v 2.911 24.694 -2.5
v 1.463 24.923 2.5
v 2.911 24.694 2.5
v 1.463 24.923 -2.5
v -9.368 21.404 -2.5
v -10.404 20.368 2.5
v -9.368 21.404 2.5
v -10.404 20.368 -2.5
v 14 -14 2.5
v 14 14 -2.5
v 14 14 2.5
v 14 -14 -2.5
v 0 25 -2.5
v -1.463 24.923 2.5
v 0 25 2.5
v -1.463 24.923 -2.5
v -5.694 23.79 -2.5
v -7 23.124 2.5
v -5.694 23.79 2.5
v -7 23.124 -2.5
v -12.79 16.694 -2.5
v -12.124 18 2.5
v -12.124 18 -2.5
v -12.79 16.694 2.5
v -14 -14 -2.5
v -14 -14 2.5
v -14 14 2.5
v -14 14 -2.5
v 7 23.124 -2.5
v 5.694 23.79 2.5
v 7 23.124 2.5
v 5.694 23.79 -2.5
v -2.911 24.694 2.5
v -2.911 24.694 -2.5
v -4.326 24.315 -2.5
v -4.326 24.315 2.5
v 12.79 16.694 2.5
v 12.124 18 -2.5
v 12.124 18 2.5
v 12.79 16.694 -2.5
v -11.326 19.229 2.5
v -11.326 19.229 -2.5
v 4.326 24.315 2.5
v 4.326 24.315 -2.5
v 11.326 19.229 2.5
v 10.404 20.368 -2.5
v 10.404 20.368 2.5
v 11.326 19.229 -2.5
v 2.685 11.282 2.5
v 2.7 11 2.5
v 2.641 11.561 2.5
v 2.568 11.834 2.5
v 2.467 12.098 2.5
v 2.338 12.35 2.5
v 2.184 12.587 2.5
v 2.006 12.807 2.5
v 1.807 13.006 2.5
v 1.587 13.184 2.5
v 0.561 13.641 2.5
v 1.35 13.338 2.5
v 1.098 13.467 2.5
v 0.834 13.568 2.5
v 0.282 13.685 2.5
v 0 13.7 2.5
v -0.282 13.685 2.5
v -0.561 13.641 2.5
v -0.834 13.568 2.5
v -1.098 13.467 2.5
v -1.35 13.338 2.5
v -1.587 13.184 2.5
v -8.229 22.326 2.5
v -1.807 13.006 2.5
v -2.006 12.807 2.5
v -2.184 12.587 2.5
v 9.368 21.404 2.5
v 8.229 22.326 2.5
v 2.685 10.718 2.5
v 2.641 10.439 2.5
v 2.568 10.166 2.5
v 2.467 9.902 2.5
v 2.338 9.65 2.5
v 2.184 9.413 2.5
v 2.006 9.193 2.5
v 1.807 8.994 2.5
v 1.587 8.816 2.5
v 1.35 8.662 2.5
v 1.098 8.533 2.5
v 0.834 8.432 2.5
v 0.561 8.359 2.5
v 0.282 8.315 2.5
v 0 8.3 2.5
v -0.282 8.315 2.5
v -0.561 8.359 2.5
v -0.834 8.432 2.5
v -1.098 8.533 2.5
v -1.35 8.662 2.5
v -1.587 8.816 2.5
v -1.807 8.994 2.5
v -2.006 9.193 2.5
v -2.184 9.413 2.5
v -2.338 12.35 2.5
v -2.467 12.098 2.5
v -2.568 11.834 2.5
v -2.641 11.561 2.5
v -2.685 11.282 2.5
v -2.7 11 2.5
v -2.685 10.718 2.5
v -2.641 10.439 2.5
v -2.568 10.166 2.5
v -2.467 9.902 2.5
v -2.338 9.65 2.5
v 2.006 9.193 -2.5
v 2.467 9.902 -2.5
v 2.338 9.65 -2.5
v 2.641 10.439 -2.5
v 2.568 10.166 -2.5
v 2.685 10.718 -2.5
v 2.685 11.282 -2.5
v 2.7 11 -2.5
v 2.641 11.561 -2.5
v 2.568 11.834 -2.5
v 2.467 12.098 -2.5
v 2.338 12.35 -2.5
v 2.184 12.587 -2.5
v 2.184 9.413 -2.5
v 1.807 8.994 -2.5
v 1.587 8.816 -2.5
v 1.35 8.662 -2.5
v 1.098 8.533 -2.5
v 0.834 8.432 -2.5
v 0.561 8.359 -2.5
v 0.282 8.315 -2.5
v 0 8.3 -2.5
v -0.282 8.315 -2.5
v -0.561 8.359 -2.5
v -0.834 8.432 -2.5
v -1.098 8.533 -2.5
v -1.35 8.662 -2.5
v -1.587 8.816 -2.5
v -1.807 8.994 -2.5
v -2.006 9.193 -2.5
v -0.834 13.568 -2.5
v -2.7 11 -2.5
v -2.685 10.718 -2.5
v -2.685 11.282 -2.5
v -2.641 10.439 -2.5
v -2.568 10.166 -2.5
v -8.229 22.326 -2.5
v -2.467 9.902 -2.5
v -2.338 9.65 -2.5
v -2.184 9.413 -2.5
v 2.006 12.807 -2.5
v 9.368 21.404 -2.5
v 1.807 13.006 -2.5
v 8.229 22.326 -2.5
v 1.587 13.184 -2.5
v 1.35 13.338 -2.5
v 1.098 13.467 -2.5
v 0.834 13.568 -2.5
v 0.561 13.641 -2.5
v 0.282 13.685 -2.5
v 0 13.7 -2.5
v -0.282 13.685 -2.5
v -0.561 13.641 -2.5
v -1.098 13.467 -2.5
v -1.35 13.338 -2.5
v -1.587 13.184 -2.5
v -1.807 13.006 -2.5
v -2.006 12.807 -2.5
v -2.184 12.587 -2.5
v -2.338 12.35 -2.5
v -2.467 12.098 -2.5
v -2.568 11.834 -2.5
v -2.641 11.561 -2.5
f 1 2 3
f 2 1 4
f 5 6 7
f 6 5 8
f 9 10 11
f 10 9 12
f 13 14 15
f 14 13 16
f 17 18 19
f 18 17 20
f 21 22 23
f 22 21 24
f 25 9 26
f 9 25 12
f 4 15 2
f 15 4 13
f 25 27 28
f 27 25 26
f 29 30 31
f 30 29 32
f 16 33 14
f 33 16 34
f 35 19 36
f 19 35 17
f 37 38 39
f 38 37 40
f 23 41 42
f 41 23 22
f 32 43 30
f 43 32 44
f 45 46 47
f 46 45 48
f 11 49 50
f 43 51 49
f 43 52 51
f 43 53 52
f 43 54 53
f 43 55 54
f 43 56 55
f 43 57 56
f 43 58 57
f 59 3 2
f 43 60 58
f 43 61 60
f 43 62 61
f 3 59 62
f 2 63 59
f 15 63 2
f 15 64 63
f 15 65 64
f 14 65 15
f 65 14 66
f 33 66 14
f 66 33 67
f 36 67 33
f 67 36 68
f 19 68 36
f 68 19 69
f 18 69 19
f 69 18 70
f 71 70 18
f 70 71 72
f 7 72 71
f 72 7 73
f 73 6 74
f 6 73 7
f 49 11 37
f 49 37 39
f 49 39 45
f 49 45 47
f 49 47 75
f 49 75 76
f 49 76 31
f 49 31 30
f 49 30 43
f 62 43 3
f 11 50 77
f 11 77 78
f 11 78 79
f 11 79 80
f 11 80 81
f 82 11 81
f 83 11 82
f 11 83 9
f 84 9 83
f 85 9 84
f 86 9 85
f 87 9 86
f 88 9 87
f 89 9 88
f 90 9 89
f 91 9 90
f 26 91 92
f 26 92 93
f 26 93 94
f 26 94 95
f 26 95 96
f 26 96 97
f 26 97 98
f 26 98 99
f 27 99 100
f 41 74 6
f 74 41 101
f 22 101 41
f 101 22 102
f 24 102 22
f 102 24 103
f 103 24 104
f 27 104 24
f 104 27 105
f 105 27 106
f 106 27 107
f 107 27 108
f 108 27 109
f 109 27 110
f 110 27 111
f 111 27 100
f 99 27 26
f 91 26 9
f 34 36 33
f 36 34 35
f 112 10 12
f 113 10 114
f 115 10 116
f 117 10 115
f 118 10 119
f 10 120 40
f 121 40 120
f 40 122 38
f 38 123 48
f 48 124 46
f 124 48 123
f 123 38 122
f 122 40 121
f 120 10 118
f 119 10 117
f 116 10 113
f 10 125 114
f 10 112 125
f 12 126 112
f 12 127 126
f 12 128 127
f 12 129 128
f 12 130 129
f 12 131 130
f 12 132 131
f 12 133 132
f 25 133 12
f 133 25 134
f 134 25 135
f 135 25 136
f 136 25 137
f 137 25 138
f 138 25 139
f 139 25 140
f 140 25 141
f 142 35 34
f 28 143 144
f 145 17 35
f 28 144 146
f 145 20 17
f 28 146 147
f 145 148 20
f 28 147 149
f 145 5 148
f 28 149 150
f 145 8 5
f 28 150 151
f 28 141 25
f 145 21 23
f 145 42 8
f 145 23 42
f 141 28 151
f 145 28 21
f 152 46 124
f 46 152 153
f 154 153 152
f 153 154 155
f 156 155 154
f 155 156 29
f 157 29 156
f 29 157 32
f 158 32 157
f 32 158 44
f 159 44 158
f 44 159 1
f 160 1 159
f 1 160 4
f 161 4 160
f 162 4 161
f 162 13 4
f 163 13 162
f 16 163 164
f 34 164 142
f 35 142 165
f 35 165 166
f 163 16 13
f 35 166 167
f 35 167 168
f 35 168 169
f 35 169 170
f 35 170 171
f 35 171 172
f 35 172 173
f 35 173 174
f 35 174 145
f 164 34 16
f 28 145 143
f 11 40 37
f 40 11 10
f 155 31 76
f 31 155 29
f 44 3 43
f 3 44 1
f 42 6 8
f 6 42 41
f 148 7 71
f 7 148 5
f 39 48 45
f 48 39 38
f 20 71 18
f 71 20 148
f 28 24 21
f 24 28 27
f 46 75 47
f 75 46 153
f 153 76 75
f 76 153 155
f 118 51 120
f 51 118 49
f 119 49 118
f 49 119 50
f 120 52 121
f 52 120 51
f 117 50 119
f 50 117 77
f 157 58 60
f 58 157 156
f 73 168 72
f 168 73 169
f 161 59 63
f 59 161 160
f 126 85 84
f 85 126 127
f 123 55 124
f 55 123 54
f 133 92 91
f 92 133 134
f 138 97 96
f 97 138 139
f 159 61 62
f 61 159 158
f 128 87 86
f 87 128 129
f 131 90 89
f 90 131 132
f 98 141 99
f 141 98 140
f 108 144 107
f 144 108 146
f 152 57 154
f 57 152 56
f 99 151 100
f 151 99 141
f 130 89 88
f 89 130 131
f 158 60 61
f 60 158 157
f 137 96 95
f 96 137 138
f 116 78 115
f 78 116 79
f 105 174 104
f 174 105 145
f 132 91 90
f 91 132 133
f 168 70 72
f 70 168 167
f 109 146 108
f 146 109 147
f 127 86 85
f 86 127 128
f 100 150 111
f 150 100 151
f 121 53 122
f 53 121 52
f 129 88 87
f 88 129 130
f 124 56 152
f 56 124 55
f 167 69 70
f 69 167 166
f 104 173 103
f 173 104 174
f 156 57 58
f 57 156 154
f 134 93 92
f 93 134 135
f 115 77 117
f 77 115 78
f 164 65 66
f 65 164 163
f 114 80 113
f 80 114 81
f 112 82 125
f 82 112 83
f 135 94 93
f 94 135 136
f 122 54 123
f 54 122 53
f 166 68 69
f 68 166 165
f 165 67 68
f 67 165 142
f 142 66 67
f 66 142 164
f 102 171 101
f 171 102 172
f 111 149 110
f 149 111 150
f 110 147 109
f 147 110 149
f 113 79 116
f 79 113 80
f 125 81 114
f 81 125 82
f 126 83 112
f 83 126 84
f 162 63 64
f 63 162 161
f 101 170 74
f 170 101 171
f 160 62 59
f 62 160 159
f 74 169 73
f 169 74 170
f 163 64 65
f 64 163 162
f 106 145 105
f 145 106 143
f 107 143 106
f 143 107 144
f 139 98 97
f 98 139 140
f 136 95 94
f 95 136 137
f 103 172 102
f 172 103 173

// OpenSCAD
// Single-hole mounting tab.
$fn = 60;
eps = 0.02;
tab_w = 28;
tab_h = 50;
tab_t = 5;
difference() {
    hull() { translate([0,0,0]) cube([tab_w,tab_w,tab_t],center=true); translate([0,tab_h/2-tab_w/2,0]) cylinder(d=tab_w,h=tab_t,center=true); }
    translate([0,tab_h/2-tab_w/2,-tab_t/2-eps]) cylinder(d=5.4,h=tab_t+2*eps);
}
